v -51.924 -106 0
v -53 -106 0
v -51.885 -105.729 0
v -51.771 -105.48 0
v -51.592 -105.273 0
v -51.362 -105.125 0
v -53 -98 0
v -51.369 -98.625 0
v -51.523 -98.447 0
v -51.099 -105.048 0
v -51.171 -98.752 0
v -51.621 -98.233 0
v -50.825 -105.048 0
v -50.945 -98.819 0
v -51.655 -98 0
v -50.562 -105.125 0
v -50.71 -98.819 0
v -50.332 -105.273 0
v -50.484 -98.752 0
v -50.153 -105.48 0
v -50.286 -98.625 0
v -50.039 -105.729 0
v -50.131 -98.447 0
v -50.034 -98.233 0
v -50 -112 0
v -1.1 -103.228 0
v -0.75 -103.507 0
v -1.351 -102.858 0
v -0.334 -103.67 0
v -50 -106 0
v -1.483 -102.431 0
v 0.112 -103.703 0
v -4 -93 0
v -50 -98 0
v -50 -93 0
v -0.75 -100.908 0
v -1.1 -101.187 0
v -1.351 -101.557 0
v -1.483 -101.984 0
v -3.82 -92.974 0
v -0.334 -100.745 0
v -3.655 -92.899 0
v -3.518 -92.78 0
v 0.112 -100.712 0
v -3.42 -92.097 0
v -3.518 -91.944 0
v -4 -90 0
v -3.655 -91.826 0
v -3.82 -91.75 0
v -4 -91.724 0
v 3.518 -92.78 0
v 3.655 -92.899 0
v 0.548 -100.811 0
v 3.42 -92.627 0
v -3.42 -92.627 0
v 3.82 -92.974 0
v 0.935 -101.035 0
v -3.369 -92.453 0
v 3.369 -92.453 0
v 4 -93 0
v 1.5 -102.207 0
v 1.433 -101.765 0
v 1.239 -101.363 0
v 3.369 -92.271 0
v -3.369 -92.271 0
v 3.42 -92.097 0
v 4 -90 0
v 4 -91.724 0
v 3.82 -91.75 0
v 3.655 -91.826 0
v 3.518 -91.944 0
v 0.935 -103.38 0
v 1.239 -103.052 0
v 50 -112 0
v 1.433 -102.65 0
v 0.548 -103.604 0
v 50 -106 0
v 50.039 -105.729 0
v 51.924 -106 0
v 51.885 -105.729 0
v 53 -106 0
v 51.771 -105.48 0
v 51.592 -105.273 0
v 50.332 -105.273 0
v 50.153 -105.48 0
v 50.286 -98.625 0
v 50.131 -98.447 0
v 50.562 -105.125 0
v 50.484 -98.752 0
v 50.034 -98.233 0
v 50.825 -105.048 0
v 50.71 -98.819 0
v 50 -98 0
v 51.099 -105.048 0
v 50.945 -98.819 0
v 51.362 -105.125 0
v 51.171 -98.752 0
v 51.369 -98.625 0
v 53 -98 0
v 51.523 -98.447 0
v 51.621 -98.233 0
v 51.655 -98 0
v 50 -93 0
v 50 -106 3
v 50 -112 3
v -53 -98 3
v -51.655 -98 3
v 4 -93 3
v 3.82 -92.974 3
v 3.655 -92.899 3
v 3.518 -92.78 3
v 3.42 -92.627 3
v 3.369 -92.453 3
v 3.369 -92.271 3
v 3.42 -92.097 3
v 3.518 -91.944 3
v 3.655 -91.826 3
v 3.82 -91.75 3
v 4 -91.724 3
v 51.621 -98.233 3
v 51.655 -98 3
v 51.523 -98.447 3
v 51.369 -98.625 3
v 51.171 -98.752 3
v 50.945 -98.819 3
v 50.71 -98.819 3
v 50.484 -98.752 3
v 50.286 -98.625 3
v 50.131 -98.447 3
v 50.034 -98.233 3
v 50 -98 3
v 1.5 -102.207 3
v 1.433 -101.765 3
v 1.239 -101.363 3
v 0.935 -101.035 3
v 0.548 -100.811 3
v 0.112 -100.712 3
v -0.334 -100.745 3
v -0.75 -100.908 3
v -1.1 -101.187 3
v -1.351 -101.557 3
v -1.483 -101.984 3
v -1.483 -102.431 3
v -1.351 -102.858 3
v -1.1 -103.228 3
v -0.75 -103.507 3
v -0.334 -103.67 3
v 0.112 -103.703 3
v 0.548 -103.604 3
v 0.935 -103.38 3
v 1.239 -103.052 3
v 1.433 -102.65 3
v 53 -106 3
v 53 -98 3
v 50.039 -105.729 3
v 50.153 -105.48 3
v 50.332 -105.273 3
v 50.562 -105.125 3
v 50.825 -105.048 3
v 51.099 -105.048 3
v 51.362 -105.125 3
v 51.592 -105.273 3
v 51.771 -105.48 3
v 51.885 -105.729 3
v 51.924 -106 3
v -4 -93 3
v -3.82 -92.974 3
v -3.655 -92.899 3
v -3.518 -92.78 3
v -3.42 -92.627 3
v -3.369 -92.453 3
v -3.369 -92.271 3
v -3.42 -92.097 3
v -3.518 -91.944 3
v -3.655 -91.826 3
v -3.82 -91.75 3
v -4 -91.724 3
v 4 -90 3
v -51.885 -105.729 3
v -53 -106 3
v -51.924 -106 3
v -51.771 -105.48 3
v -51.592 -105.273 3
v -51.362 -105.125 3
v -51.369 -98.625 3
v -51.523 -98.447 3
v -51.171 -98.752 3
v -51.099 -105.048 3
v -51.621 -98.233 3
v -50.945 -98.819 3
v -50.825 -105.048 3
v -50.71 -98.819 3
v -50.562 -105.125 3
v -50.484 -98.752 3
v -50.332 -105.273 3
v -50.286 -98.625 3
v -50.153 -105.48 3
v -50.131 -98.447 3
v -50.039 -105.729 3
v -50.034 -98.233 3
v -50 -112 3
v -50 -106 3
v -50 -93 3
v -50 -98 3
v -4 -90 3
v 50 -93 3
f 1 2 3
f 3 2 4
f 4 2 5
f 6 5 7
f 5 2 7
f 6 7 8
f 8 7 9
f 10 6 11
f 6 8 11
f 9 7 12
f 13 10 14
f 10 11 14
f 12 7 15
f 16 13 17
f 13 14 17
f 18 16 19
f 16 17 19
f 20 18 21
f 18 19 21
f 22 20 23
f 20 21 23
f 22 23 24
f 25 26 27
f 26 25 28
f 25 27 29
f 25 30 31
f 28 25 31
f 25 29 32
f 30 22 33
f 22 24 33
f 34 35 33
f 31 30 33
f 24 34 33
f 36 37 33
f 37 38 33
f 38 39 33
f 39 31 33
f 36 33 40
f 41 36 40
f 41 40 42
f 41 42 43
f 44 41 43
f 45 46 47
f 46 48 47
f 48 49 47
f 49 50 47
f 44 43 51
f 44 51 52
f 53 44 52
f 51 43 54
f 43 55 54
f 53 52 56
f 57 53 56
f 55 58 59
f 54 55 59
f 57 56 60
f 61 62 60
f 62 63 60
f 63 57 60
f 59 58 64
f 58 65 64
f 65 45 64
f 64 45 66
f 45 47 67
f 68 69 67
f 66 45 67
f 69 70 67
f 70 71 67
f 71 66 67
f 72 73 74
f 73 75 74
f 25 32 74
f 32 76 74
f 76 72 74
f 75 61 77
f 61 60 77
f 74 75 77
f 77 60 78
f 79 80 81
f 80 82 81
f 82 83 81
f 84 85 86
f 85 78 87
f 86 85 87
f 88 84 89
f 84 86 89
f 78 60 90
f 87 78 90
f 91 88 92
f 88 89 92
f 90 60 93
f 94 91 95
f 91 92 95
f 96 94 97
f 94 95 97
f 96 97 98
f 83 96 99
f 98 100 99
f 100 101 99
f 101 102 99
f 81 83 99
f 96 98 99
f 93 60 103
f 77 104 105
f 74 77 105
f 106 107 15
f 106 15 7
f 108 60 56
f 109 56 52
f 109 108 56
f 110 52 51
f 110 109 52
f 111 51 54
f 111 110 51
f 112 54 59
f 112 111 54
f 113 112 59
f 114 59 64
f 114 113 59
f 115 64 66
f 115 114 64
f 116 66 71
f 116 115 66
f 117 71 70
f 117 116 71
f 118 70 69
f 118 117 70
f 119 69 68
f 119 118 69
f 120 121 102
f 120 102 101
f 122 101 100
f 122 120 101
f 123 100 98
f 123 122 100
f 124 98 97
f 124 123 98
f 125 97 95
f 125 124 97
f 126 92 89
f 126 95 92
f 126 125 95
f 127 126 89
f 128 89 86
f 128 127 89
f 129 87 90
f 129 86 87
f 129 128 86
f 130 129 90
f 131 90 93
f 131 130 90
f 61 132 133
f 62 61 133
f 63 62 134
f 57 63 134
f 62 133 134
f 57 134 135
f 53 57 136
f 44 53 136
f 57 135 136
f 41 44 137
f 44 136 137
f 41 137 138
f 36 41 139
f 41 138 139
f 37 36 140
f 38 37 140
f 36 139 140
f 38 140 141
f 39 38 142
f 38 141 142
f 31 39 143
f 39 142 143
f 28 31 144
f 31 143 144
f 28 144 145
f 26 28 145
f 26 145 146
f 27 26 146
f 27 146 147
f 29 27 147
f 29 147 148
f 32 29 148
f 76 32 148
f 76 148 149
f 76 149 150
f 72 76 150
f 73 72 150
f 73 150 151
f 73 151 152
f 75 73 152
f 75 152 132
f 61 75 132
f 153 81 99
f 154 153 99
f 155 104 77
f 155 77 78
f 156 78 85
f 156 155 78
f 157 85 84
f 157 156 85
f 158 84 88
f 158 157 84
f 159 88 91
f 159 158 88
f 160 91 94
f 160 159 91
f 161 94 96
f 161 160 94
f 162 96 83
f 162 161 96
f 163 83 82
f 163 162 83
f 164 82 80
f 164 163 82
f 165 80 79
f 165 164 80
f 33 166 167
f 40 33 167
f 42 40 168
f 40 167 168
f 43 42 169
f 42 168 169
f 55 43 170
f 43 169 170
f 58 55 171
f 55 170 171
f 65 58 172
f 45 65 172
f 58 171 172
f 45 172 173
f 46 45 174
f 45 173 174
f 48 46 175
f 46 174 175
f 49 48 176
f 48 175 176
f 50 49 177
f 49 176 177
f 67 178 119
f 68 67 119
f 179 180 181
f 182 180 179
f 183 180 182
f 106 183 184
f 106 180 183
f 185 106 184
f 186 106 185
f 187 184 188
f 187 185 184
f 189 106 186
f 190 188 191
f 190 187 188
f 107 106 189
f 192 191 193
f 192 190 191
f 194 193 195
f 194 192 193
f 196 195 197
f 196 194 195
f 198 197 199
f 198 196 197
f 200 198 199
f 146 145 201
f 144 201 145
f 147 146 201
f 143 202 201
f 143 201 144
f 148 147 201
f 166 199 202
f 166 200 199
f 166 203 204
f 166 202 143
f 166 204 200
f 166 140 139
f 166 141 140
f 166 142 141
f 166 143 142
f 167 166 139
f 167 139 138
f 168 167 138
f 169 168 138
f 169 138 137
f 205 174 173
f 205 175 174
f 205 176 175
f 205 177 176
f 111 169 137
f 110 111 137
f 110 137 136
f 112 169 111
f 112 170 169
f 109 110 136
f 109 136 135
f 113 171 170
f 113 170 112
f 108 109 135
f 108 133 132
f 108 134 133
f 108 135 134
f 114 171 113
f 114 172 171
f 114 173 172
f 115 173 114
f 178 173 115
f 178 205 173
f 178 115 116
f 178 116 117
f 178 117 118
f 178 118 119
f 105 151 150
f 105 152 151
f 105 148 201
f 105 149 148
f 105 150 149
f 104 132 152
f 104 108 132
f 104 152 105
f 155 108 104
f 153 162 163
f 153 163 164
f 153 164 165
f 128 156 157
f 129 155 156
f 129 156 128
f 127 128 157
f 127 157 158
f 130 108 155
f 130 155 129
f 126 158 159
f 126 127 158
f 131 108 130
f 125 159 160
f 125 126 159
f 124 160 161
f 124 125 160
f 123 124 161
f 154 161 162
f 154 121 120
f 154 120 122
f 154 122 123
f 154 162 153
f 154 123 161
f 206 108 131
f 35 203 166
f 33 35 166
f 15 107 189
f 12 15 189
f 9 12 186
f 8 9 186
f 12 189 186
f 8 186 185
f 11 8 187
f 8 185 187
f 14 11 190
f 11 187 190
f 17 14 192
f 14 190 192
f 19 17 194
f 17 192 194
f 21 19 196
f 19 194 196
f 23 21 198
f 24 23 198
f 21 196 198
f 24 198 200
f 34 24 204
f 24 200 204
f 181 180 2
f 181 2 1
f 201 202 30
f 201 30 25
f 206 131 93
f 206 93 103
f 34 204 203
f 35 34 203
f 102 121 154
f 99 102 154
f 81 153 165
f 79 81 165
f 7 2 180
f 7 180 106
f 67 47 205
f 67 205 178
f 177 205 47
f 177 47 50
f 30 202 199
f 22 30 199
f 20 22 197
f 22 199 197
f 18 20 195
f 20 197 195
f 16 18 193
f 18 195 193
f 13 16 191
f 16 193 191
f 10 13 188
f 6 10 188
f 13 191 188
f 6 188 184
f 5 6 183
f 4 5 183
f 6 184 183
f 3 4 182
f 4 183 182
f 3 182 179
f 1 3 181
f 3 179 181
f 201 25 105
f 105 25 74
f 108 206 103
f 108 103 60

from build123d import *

# Parameters (mm, degrees)
SKETCH009_W        = 106
SKETCH009_H        = 22
PAD003_DEPTH       = 3
POCKET003002_DEPTH = 219.602016
SKETCH001007_R     = 1.5
POCKET003007_DEPTH = 3.001


with BuildPart() as part:
    # Sketch009 → Pad003 (new body)
    with BuildSketch(Plane.XY):
        with Locations((0, -101)):
            Rectangle(SKETCH009_W, SKETCH009_H)
    extrude(amount=PAD003_DEPTH)

    # Sketch001001 → Pocket003002 (cut, through all)
    with BuildSketch(Plane.XY.offset(3)):
        with BuildLine():
            Line((-50, -106), (-50, -112))
            Line((-50, -112), (-53, -112))
            Line((-53, -112), (-53, -106))
            Line((-53, -106), (-51.923996, -106))
            ThreePointArc((-50, -106), (-50.961998, -105.038002), (-51.923996, -106))
        make_face()
        with BuildLine():
            Line((-4, -90), (-53, -90))
            Line((-53, -90), (-53, -98))
            Line((-51.654504, -98), (-53, -98))
            ThreePointArc((-51.654504, -98), (-50.827252, -98.827252), (-50, -98))
            Line((-50, -98), (-50, -93))
            Line((-50, -93), (-4, -93))
            ThreePointArc((-4, -93), (-3.362141, -92.362141), (-4, -91.724282))
            Line((-4, -90), (-4, -91.724282))
        make_face()
    pocket003002 = extrude(amount=-POCKET003002_DEPTH, mode=Mode.SUBTRACT)

    # Mirrored002: Pocket003002 across Sketch001001 V_Axis
    add(pocket003002.mirror(Plane(origin=(0, 0, 3), x_dir=(0, 0, 1), z_dir=(1, 0, 0))), mode=Mode.SUBTRACT)

    # Sketch001007 → Pocket003007 (cut, through all)
    with BuildSketch(Plane.XY.offset(3)):
        with Locations((0, -102.207499)):
            Circle(SKETCH001007_R)
    extrude(amount=-POCKET003007_DEPTH, mode=Mode.SUBTRACT)


solid = part.part
